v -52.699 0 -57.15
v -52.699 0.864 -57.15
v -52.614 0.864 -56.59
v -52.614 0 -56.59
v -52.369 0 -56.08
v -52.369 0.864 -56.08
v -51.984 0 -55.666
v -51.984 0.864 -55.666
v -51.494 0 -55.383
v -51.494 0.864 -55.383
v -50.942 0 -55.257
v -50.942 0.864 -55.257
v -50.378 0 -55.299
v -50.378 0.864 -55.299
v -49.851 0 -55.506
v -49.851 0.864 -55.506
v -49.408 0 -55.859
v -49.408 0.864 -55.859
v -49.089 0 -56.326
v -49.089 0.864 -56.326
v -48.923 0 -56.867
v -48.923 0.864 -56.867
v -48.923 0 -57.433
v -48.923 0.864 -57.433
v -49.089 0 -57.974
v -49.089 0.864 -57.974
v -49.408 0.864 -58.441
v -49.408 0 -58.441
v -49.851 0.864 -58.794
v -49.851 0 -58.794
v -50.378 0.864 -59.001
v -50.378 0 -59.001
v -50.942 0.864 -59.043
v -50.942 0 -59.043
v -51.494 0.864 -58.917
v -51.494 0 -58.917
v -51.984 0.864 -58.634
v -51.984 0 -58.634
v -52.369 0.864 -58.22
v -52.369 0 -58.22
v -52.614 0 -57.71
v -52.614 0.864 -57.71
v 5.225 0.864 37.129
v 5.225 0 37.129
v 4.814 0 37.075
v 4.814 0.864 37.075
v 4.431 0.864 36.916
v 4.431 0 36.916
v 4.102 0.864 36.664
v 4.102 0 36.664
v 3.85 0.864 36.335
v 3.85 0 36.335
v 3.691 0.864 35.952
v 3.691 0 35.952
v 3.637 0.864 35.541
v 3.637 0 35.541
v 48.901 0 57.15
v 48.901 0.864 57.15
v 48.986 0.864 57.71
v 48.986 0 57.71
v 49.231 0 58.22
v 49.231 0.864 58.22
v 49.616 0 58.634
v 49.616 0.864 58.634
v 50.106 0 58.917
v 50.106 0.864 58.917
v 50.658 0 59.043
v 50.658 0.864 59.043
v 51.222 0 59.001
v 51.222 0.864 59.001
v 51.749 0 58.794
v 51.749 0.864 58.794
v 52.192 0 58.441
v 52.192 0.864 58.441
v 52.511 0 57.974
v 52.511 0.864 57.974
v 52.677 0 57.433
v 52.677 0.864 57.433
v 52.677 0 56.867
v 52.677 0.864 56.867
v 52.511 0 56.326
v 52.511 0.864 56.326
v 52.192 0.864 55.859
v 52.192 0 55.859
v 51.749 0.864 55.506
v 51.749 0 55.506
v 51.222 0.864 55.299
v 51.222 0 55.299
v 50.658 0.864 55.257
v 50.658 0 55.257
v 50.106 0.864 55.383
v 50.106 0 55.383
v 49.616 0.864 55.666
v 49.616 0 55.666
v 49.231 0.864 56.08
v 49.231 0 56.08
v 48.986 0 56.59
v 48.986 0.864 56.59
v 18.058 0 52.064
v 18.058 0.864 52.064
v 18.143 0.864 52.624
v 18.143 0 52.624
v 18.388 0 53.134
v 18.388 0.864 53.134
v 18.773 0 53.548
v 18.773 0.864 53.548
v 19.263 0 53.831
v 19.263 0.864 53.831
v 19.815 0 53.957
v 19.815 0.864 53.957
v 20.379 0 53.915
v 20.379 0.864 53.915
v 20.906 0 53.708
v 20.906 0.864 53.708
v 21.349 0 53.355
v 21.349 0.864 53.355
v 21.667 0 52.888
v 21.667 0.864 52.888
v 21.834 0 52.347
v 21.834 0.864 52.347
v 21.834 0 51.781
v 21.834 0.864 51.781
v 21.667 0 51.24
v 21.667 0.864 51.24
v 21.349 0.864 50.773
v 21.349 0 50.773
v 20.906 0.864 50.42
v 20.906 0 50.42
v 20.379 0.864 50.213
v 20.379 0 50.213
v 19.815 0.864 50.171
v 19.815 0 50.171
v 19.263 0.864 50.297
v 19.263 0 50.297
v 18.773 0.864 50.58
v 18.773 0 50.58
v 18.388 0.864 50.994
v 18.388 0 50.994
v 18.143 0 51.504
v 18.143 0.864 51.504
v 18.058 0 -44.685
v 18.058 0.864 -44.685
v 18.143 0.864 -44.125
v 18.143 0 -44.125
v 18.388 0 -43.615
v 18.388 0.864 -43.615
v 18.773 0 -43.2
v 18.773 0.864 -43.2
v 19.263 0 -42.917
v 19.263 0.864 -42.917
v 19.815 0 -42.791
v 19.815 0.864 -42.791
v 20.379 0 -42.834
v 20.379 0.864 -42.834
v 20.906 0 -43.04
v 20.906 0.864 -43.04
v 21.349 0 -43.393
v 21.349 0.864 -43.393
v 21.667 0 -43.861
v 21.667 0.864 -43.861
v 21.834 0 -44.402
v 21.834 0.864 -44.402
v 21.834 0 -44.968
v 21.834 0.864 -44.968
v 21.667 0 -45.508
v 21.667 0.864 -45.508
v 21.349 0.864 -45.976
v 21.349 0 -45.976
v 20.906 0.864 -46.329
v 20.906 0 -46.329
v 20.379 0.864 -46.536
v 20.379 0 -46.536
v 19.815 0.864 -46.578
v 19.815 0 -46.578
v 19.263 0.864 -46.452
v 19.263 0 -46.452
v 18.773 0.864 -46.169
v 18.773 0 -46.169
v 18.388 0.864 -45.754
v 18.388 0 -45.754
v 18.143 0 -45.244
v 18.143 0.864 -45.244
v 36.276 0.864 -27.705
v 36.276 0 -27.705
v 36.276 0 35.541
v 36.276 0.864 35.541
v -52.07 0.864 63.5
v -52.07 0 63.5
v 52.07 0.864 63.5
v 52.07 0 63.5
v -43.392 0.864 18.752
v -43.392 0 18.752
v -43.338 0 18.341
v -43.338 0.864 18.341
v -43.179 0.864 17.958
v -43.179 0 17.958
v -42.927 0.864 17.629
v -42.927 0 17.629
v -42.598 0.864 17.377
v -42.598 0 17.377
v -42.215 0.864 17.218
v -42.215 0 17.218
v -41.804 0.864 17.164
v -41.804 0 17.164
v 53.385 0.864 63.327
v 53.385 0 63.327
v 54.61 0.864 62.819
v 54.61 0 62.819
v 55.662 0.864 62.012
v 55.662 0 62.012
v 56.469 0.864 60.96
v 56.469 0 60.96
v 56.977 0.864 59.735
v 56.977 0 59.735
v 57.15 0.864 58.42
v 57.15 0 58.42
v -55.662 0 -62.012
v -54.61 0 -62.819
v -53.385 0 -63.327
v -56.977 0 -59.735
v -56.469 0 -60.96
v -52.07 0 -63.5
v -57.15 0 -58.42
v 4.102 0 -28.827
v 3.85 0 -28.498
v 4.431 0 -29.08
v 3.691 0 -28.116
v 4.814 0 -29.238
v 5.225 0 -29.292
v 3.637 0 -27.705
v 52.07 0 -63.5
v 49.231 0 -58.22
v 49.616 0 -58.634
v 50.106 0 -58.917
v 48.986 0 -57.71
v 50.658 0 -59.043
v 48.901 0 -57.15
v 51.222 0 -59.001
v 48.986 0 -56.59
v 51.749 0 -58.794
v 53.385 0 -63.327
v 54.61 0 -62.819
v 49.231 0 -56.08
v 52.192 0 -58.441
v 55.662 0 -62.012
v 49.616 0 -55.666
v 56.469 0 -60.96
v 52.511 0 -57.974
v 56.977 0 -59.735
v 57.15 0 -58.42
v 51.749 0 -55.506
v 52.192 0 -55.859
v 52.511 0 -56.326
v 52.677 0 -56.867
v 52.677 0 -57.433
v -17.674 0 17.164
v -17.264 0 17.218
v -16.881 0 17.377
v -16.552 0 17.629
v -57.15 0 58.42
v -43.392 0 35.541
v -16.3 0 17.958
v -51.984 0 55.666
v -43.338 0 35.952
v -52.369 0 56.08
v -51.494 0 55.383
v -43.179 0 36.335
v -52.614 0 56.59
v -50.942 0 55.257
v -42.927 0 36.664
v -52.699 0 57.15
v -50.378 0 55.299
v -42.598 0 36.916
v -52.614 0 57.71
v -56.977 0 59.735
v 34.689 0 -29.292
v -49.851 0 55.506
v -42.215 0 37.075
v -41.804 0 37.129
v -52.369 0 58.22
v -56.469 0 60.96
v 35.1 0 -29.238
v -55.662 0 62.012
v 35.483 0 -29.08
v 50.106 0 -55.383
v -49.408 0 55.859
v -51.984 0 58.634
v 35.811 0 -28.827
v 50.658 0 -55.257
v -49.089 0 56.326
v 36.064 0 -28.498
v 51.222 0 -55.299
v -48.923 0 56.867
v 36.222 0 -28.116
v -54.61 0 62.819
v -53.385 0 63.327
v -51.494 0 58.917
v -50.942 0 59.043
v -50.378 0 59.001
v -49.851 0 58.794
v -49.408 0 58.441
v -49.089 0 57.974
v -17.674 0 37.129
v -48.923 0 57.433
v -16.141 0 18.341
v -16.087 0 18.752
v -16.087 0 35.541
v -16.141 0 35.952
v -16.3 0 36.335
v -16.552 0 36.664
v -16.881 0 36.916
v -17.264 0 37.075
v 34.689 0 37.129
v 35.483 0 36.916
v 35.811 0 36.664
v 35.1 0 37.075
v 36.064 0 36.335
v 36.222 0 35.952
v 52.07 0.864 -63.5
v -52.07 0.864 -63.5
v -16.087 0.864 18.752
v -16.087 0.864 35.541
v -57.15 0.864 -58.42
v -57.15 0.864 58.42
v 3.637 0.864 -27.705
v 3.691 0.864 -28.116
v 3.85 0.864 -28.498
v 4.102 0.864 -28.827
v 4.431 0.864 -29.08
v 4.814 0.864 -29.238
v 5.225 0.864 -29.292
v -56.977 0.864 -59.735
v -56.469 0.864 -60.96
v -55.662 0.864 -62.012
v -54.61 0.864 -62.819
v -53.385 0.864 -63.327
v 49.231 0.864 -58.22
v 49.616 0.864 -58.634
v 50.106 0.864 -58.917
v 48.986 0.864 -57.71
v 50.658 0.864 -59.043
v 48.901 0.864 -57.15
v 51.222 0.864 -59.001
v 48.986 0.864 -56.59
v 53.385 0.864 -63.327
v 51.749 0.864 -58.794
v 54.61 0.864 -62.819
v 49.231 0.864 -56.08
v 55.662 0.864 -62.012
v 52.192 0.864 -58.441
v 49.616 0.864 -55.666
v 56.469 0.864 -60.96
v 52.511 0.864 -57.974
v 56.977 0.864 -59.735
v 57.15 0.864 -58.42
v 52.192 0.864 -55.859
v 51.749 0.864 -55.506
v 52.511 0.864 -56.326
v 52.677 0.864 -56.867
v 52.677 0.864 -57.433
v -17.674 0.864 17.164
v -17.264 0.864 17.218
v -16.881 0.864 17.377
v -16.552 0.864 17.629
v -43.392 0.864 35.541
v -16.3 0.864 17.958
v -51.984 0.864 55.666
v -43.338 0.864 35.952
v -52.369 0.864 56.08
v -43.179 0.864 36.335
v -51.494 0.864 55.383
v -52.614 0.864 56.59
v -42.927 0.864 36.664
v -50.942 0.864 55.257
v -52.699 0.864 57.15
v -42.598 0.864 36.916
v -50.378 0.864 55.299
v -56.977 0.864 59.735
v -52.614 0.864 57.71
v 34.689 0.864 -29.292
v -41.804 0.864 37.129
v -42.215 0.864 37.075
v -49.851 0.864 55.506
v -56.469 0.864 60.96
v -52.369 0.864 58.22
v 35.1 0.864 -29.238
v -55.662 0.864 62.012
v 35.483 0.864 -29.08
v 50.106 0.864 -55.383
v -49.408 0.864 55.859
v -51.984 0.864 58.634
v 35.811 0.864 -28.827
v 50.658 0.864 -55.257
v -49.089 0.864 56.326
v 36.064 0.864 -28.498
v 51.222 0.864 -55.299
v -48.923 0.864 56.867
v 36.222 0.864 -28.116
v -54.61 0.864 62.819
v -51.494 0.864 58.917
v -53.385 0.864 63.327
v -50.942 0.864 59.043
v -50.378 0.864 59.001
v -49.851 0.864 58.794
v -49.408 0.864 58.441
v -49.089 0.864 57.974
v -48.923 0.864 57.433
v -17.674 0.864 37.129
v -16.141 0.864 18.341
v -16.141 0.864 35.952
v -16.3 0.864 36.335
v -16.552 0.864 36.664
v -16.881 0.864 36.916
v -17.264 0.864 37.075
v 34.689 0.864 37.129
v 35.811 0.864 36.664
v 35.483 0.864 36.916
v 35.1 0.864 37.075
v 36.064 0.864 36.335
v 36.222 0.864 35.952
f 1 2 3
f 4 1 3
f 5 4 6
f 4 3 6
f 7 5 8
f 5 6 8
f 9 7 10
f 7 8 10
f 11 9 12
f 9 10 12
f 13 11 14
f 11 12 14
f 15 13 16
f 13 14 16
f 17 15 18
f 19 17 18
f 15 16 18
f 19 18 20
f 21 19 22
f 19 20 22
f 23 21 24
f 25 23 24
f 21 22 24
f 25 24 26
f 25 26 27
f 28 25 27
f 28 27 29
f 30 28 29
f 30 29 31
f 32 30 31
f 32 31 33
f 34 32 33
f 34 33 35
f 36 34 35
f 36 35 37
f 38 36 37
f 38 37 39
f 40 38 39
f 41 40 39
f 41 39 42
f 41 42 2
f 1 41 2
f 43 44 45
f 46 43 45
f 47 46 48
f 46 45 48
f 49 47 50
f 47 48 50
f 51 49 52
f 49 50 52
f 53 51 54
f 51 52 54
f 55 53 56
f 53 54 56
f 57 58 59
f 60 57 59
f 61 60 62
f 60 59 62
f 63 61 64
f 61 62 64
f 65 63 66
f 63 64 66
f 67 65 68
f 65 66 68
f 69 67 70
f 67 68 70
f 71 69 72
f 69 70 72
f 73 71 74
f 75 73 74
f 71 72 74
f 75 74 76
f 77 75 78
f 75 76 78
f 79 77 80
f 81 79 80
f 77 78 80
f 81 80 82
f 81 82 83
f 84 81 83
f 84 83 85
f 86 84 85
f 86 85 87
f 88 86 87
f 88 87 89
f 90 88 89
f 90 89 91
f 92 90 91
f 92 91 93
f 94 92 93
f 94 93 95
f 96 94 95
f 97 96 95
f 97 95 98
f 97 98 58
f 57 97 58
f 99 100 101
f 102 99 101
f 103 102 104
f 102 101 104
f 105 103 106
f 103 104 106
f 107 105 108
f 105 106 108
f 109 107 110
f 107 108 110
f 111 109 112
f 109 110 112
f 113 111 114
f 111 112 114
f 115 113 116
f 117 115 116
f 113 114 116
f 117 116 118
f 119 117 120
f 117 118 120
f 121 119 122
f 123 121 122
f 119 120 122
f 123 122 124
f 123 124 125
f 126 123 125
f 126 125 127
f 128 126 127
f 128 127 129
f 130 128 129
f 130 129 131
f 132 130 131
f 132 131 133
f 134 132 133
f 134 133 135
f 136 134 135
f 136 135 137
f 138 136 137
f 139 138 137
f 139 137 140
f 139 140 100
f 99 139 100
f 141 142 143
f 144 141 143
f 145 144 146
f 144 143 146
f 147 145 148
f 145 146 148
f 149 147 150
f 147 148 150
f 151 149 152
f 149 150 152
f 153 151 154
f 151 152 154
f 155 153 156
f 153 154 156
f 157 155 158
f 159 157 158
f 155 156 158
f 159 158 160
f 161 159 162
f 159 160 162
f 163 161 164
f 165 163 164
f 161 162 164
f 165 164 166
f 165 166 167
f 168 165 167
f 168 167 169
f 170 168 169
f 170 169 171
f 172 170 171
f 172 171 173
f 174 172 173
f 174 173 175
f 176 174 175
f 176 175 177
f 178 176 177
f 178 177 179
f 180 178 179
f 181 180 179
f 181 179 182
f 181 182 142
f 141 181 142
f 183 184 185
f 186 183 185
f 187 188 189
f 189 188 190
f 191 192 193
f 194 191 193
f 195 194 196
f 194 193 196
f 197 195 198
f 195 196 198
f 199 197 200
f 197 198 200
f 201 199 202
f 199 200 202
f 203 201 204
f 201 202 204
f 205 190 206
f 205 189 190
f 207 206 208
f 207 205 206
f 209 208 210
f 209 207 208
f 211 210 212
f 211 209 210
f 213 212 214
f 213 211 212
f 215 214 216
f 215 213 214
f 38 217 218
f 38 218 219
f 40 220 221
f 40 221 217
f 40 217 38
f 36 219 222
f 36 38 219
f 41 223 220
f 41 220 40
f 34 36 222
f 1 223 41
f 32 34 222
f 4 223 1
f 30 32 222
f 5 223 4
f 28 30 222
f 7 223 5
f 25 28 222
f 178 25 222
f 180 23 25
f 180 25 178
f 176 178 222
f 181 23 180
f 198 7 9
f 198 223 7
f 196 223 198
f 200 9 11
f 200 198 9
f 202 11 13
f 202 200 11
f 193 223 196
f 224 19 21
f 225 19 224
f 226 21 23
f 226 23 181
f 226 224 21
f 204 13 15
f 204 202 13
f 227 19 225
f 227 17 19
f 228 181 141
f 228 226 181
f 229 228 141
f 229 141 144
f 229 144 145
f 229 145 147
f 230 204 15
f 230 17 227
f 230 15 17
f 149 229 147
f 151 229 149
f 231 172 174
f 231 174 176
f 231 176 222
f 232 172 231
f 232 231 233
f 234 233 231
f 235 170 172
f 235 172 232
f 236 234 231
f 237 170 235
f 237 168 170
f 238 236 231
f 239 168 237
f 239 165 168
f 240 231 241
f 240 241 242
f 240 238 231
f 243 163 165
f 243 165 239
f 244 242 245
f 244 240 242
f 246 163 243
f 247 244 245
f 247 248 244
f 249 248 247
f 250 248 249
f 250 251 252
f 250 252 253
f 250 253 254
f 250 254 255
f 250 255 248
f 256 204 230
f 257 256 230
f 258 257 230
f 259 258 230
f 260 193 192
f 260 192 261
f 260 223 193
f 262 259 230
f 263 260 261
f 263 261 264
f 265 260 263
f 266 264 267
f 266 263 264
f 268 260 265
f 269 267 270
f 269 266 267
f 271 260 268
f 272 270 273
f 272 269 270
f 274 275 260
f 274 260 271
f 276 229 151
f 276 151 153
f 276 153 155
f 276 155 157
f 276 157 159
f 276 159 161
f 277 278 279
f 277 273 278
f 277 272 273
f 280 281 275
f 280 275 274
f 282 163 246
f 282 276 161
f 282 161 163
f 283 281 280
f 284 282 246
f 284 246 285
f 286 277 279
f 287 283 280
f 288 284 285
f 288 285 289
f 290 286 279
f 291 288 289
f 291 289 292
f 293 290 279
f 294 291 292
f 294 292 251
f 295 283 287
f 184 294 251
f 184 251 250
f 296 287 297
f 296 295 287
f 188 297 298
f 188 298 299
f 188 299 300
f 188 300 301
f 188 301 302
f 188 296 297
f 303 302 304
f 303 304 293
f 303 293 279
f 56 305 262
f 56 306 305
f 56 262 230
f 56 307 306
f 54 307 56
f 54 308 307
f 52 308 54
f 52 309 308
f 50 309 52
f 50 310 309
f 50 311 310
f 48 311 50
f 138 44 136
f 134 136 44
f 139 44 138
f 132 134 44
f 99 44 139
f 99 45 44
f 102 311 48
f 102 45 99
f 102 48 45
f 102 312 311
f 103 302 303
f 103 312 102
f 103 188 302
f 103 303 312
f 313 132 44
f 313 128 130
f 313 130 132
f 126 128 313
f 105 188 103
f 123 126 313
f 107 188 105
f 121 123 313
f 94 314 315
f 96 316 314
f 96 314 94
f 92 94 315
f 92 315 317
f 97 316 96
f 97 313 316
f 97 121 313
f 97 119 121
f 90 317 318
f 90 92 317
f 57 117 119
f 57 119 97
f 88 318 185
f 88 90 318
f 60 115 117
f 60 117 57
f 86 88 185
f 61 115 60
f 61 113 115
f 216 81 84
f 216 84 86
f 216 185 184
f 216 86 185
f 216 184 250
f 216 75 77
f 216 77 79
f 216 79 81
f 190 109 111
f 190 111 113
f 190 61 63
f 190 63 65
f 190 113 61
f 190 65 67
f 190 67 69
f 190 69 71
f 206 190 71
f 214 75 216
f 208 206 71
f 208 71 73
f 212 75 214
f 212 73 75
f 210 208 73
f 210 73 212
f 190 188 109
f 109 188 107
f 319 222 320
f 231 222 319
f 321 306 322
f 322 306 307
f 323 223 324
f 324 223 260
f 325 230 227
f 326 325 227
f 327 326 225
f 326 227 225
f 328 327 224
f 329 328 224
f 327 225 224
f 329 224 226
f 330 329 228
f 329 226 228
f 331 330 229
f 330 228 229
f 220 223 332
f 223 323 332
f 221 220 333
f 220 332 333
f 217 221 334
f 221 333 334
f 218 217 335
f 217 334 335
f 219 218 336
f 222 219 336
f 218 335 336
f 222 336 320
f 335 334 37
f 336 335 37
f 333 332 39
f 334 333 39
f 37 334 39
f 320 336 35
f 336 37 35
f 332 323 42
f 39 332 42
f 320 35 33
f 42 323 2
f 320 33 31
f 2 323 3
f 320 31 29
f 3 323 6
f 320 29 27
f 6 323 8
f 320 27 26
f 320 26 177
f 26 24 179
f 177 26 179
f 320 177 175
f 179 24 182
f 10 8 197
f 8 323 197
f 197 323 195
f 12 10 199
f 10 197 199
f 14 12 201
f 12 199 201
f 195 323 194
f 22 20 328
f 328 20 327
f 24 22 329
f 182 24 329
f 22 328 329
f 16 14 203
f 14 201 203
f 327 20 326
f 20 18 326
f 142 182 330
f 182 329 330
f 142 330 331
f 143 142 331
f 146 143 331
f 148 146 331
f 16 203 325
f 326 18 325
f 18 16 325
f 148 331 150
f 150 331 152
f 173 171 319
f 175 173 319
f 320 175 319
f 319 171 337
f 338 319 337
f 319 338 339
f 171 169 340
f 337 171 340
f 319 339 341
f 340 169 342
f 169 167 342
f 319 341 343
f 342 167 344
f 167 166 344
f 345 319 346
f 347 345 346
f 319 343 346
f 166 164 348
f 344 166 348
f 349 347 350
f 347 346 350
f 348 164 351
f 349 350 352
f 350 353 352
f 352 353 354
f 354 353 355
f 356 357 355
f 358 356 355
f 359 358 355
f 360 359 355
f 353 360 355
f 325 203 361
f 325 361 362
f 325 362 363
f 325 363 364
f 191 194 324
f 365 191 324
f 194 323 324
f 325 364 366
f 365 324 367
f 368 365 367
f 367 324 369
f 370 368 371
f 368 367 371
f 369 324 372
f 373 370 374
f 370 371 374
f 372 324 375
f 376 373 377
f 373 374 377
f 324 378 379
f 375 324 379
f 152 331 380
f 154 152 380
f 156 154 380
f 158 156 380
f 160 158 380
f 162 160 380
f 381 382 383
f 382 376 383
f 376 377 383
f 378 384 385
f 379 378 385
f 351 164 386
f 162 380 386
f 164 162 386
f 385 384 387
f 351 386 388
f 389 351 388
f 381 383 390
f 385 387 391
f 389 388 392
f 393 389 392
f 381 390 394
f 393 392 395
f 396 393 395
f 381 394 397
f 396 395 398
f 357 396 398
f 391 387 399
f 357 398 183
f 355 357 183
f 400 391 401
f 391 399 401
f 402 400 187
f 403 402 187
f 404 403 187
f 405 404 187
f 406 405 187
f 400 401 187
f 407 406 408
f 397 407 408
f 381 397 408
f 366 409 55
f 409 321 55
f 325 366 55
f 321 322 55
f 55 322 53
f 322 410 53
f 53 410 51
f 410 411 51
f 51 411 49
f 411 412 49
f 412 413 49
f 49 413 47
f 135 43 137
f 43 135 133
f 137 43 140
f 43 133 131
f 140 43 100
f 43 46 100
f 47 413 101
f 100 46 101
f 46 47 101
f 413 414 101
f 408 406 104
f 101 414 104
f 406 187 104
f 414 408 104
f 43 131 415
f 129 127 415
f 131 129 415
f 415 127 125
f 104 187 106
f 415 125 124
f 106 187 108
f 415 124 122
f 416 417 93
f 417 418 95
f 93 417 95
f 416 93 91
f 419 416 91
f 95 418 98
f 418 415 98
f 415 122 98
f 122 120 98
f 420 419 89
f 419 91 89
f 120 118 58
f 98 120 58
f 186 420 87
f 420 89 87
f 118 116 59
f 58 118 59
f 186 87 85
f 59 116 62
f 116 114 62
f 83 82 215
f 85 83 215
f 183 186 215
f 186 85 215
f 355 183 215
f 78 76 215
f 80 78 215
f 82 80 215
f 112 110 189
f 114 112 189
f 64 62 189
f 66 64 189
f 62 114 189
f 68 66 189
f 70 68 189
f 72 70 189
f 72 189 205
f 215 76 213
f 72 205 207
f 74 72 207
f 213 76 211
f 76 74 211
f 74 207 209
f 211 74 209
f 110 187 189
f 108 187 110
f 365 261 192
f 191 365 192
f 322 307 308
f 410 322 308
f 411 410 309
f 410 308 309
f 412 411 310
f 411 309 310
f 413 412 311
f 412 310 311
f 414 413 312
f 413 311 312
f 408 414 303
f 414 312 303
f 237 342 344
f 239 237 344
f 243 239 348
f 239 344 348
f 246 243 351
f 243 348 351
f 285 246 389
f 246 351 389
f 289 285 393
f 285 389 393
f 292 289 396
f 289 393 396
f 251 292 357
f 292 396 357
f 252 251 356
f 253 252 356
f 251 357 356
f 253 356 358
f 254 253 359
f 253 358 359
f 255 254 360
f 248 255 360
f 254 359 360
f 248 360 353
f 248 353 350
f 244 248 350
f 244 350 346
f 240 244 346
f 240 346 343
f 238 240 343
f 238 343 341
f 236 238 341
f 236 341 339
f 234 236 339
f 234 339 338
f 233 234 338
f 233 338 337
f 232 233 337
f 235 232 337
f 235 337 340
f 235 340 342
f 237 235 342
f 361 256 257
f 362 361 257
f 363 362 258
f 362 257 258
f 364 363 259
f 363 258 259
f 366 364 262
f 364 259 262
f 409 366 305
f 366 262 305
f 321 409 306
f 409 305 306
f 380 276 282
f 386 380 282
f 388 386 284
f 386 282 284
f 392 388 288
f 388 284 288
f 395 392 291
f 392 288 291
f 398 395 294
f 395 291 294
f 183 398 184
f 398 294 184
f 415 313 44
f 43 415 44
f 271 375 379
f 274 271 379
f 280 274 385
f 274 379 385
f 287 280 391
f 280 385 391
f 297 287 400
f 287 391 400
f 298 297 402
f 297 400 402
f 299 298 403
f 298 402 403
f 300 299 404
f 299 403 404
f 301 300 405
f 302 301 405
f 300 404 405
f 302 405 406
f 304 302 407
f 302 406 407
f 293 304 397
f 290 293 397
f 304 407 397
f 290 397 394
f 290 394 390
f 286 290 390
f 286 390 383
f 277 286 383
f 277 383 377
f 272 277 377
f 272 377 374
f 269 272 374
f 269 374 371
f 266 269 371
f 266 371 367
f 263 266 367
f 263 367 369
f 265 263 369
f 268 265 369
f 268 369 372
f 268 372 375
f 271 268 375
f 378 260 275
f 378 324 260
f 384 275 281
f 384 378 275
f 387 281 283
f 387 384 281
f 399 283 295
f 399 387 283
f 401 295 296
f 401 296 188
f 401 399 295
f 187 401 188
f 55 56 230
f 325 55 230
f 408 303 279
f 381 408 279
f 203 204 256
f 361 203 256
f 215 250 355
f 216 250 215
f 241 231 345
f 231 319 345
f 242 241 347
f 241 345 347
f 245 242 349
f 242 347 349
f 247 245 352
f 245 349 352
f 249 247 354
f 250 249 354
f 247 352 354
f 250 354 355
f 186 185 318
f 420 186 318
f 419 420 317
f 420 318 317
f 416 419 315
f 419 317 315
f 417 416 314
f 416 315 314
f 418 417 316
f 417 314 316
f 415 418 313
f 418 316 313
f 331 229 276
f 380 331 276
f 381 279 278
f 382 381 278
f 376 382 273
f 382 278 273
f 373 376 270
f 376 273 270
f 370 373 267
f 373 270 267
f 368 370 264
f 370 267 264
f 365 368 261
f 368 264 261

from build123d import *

# Parameters (mm, degrees)
F0_W     = 114.3
F0_H     = 127
F1_DEPTH = 0.8636
F3_DEPTH = 0.8636
F4_R     = 5.08
F6_D     = 3.7973
F8_D     = 3.7973


with BuildPart() as f1:
    # F0 (on Front) → F1 (new body)
    with BuildSketch(Plane.XZ):
        Rectangle(F0_W, F0_H)
    extrude(amount=-F1_DEPTH)

    # F2 (on face) → F3 (cut, through all)
    with BuildSketch(Plane.XZ):
        with BuildLine():
            ThreePointArc((-16.0869264489, 35.5412906039), (-16.5518944338, 36.663822619), (-17.6744264489, 37.1287906039))
            Line((-17.6744264489, 37.1287906039), (-41.8044264489, 37.1287906039))
            ThreePointArc((-41.8044264489, 37.1287906039), (-42.9269584641, 36.663822619), (-43.3919264489, 35.5412906039))
            Line((-43.3919264489, 35.5412906039), (-43.3919264489, 18.7518906039))
            ThreePointArc((-43.3919264489, 18.7518906039), (-42.9269584641, 17.6293585888), (-41.8044264489, 17.1643906039))
            Line((-41.8044264489, 17.1643906039), (-17.6744264489, 17.1643906039))
            ThreePointArc((-17.6744264489, 17.1643906039), (-16.5518944338, 17.6293585888), (-16.0869264489, 18.7518906039))
            Line((-16.0869264489, 18.7518906039), (-16.0869264489, 35.5412906039))
        make_face()
        with BuildLine():
            ThreePointArc((36.2763346143, 35.5412906039), (35.8113666294, 36.663822619), (34.6888346143, 37.1287906039))
            Line((34.6888346143, 37.1287906039), (5.2248346143, 37.1287906039))
            ThreePointArc((5.2248346143, 37.1287906039), (4.1023025991, 36.663822619), (3.6373346143, 35.5412906039))
            Line((3.6373346143, 35.5412906039), (3.6373346143, -27.7047093961))
            ThreePointArc((3.6373346143, -27.7047093961), (4.1023025991, -28.8272414112), (5.2248346143, -29.2922093961))
            Line((5.2248346143, -29.2922093961), (34.6888346143, -29.2922093961))
            ThreePointArc((34.6888346143, -29.2922093961), (35.8113666294, -28.8272414112), (36.2763346143, -27.7047093961))
            Line((36.2763346143, -27.7047093961), (36.2763346143, 35.5412906039))
        make_face()
    extrude(amount=-F3_DEPTH, mode=Mode.SUBTRACT)

    # F4
    f4_edges = [f1.edges().sort_by_distance(p)[0] for p in [
        (-57.15, 0.4318, 63.5),
        (57.15, 0.4318, 63.5),
        (57.15, 0.4318, -63.5),
        (-57.15, 0.4318, -63.5),
    ]]
    fillet(f4_edges, radius=F4_R)

    # F6 (through all)
    with Locations(Plane.XZ):
        with Locations((19.9568346143, 52.0639906039), (19.9568346143, -44.6846093961)):
            Hole(F6_D / 2)

    # F8 (through all)
    with Locations(Plane.XZ):
        with Locations((-50.8, 57.15), (50.8, 57.15), (50.8, -57.15), (-50.8, -57.15)):
            Hole(F8_D / 2)


solid = f1.part
